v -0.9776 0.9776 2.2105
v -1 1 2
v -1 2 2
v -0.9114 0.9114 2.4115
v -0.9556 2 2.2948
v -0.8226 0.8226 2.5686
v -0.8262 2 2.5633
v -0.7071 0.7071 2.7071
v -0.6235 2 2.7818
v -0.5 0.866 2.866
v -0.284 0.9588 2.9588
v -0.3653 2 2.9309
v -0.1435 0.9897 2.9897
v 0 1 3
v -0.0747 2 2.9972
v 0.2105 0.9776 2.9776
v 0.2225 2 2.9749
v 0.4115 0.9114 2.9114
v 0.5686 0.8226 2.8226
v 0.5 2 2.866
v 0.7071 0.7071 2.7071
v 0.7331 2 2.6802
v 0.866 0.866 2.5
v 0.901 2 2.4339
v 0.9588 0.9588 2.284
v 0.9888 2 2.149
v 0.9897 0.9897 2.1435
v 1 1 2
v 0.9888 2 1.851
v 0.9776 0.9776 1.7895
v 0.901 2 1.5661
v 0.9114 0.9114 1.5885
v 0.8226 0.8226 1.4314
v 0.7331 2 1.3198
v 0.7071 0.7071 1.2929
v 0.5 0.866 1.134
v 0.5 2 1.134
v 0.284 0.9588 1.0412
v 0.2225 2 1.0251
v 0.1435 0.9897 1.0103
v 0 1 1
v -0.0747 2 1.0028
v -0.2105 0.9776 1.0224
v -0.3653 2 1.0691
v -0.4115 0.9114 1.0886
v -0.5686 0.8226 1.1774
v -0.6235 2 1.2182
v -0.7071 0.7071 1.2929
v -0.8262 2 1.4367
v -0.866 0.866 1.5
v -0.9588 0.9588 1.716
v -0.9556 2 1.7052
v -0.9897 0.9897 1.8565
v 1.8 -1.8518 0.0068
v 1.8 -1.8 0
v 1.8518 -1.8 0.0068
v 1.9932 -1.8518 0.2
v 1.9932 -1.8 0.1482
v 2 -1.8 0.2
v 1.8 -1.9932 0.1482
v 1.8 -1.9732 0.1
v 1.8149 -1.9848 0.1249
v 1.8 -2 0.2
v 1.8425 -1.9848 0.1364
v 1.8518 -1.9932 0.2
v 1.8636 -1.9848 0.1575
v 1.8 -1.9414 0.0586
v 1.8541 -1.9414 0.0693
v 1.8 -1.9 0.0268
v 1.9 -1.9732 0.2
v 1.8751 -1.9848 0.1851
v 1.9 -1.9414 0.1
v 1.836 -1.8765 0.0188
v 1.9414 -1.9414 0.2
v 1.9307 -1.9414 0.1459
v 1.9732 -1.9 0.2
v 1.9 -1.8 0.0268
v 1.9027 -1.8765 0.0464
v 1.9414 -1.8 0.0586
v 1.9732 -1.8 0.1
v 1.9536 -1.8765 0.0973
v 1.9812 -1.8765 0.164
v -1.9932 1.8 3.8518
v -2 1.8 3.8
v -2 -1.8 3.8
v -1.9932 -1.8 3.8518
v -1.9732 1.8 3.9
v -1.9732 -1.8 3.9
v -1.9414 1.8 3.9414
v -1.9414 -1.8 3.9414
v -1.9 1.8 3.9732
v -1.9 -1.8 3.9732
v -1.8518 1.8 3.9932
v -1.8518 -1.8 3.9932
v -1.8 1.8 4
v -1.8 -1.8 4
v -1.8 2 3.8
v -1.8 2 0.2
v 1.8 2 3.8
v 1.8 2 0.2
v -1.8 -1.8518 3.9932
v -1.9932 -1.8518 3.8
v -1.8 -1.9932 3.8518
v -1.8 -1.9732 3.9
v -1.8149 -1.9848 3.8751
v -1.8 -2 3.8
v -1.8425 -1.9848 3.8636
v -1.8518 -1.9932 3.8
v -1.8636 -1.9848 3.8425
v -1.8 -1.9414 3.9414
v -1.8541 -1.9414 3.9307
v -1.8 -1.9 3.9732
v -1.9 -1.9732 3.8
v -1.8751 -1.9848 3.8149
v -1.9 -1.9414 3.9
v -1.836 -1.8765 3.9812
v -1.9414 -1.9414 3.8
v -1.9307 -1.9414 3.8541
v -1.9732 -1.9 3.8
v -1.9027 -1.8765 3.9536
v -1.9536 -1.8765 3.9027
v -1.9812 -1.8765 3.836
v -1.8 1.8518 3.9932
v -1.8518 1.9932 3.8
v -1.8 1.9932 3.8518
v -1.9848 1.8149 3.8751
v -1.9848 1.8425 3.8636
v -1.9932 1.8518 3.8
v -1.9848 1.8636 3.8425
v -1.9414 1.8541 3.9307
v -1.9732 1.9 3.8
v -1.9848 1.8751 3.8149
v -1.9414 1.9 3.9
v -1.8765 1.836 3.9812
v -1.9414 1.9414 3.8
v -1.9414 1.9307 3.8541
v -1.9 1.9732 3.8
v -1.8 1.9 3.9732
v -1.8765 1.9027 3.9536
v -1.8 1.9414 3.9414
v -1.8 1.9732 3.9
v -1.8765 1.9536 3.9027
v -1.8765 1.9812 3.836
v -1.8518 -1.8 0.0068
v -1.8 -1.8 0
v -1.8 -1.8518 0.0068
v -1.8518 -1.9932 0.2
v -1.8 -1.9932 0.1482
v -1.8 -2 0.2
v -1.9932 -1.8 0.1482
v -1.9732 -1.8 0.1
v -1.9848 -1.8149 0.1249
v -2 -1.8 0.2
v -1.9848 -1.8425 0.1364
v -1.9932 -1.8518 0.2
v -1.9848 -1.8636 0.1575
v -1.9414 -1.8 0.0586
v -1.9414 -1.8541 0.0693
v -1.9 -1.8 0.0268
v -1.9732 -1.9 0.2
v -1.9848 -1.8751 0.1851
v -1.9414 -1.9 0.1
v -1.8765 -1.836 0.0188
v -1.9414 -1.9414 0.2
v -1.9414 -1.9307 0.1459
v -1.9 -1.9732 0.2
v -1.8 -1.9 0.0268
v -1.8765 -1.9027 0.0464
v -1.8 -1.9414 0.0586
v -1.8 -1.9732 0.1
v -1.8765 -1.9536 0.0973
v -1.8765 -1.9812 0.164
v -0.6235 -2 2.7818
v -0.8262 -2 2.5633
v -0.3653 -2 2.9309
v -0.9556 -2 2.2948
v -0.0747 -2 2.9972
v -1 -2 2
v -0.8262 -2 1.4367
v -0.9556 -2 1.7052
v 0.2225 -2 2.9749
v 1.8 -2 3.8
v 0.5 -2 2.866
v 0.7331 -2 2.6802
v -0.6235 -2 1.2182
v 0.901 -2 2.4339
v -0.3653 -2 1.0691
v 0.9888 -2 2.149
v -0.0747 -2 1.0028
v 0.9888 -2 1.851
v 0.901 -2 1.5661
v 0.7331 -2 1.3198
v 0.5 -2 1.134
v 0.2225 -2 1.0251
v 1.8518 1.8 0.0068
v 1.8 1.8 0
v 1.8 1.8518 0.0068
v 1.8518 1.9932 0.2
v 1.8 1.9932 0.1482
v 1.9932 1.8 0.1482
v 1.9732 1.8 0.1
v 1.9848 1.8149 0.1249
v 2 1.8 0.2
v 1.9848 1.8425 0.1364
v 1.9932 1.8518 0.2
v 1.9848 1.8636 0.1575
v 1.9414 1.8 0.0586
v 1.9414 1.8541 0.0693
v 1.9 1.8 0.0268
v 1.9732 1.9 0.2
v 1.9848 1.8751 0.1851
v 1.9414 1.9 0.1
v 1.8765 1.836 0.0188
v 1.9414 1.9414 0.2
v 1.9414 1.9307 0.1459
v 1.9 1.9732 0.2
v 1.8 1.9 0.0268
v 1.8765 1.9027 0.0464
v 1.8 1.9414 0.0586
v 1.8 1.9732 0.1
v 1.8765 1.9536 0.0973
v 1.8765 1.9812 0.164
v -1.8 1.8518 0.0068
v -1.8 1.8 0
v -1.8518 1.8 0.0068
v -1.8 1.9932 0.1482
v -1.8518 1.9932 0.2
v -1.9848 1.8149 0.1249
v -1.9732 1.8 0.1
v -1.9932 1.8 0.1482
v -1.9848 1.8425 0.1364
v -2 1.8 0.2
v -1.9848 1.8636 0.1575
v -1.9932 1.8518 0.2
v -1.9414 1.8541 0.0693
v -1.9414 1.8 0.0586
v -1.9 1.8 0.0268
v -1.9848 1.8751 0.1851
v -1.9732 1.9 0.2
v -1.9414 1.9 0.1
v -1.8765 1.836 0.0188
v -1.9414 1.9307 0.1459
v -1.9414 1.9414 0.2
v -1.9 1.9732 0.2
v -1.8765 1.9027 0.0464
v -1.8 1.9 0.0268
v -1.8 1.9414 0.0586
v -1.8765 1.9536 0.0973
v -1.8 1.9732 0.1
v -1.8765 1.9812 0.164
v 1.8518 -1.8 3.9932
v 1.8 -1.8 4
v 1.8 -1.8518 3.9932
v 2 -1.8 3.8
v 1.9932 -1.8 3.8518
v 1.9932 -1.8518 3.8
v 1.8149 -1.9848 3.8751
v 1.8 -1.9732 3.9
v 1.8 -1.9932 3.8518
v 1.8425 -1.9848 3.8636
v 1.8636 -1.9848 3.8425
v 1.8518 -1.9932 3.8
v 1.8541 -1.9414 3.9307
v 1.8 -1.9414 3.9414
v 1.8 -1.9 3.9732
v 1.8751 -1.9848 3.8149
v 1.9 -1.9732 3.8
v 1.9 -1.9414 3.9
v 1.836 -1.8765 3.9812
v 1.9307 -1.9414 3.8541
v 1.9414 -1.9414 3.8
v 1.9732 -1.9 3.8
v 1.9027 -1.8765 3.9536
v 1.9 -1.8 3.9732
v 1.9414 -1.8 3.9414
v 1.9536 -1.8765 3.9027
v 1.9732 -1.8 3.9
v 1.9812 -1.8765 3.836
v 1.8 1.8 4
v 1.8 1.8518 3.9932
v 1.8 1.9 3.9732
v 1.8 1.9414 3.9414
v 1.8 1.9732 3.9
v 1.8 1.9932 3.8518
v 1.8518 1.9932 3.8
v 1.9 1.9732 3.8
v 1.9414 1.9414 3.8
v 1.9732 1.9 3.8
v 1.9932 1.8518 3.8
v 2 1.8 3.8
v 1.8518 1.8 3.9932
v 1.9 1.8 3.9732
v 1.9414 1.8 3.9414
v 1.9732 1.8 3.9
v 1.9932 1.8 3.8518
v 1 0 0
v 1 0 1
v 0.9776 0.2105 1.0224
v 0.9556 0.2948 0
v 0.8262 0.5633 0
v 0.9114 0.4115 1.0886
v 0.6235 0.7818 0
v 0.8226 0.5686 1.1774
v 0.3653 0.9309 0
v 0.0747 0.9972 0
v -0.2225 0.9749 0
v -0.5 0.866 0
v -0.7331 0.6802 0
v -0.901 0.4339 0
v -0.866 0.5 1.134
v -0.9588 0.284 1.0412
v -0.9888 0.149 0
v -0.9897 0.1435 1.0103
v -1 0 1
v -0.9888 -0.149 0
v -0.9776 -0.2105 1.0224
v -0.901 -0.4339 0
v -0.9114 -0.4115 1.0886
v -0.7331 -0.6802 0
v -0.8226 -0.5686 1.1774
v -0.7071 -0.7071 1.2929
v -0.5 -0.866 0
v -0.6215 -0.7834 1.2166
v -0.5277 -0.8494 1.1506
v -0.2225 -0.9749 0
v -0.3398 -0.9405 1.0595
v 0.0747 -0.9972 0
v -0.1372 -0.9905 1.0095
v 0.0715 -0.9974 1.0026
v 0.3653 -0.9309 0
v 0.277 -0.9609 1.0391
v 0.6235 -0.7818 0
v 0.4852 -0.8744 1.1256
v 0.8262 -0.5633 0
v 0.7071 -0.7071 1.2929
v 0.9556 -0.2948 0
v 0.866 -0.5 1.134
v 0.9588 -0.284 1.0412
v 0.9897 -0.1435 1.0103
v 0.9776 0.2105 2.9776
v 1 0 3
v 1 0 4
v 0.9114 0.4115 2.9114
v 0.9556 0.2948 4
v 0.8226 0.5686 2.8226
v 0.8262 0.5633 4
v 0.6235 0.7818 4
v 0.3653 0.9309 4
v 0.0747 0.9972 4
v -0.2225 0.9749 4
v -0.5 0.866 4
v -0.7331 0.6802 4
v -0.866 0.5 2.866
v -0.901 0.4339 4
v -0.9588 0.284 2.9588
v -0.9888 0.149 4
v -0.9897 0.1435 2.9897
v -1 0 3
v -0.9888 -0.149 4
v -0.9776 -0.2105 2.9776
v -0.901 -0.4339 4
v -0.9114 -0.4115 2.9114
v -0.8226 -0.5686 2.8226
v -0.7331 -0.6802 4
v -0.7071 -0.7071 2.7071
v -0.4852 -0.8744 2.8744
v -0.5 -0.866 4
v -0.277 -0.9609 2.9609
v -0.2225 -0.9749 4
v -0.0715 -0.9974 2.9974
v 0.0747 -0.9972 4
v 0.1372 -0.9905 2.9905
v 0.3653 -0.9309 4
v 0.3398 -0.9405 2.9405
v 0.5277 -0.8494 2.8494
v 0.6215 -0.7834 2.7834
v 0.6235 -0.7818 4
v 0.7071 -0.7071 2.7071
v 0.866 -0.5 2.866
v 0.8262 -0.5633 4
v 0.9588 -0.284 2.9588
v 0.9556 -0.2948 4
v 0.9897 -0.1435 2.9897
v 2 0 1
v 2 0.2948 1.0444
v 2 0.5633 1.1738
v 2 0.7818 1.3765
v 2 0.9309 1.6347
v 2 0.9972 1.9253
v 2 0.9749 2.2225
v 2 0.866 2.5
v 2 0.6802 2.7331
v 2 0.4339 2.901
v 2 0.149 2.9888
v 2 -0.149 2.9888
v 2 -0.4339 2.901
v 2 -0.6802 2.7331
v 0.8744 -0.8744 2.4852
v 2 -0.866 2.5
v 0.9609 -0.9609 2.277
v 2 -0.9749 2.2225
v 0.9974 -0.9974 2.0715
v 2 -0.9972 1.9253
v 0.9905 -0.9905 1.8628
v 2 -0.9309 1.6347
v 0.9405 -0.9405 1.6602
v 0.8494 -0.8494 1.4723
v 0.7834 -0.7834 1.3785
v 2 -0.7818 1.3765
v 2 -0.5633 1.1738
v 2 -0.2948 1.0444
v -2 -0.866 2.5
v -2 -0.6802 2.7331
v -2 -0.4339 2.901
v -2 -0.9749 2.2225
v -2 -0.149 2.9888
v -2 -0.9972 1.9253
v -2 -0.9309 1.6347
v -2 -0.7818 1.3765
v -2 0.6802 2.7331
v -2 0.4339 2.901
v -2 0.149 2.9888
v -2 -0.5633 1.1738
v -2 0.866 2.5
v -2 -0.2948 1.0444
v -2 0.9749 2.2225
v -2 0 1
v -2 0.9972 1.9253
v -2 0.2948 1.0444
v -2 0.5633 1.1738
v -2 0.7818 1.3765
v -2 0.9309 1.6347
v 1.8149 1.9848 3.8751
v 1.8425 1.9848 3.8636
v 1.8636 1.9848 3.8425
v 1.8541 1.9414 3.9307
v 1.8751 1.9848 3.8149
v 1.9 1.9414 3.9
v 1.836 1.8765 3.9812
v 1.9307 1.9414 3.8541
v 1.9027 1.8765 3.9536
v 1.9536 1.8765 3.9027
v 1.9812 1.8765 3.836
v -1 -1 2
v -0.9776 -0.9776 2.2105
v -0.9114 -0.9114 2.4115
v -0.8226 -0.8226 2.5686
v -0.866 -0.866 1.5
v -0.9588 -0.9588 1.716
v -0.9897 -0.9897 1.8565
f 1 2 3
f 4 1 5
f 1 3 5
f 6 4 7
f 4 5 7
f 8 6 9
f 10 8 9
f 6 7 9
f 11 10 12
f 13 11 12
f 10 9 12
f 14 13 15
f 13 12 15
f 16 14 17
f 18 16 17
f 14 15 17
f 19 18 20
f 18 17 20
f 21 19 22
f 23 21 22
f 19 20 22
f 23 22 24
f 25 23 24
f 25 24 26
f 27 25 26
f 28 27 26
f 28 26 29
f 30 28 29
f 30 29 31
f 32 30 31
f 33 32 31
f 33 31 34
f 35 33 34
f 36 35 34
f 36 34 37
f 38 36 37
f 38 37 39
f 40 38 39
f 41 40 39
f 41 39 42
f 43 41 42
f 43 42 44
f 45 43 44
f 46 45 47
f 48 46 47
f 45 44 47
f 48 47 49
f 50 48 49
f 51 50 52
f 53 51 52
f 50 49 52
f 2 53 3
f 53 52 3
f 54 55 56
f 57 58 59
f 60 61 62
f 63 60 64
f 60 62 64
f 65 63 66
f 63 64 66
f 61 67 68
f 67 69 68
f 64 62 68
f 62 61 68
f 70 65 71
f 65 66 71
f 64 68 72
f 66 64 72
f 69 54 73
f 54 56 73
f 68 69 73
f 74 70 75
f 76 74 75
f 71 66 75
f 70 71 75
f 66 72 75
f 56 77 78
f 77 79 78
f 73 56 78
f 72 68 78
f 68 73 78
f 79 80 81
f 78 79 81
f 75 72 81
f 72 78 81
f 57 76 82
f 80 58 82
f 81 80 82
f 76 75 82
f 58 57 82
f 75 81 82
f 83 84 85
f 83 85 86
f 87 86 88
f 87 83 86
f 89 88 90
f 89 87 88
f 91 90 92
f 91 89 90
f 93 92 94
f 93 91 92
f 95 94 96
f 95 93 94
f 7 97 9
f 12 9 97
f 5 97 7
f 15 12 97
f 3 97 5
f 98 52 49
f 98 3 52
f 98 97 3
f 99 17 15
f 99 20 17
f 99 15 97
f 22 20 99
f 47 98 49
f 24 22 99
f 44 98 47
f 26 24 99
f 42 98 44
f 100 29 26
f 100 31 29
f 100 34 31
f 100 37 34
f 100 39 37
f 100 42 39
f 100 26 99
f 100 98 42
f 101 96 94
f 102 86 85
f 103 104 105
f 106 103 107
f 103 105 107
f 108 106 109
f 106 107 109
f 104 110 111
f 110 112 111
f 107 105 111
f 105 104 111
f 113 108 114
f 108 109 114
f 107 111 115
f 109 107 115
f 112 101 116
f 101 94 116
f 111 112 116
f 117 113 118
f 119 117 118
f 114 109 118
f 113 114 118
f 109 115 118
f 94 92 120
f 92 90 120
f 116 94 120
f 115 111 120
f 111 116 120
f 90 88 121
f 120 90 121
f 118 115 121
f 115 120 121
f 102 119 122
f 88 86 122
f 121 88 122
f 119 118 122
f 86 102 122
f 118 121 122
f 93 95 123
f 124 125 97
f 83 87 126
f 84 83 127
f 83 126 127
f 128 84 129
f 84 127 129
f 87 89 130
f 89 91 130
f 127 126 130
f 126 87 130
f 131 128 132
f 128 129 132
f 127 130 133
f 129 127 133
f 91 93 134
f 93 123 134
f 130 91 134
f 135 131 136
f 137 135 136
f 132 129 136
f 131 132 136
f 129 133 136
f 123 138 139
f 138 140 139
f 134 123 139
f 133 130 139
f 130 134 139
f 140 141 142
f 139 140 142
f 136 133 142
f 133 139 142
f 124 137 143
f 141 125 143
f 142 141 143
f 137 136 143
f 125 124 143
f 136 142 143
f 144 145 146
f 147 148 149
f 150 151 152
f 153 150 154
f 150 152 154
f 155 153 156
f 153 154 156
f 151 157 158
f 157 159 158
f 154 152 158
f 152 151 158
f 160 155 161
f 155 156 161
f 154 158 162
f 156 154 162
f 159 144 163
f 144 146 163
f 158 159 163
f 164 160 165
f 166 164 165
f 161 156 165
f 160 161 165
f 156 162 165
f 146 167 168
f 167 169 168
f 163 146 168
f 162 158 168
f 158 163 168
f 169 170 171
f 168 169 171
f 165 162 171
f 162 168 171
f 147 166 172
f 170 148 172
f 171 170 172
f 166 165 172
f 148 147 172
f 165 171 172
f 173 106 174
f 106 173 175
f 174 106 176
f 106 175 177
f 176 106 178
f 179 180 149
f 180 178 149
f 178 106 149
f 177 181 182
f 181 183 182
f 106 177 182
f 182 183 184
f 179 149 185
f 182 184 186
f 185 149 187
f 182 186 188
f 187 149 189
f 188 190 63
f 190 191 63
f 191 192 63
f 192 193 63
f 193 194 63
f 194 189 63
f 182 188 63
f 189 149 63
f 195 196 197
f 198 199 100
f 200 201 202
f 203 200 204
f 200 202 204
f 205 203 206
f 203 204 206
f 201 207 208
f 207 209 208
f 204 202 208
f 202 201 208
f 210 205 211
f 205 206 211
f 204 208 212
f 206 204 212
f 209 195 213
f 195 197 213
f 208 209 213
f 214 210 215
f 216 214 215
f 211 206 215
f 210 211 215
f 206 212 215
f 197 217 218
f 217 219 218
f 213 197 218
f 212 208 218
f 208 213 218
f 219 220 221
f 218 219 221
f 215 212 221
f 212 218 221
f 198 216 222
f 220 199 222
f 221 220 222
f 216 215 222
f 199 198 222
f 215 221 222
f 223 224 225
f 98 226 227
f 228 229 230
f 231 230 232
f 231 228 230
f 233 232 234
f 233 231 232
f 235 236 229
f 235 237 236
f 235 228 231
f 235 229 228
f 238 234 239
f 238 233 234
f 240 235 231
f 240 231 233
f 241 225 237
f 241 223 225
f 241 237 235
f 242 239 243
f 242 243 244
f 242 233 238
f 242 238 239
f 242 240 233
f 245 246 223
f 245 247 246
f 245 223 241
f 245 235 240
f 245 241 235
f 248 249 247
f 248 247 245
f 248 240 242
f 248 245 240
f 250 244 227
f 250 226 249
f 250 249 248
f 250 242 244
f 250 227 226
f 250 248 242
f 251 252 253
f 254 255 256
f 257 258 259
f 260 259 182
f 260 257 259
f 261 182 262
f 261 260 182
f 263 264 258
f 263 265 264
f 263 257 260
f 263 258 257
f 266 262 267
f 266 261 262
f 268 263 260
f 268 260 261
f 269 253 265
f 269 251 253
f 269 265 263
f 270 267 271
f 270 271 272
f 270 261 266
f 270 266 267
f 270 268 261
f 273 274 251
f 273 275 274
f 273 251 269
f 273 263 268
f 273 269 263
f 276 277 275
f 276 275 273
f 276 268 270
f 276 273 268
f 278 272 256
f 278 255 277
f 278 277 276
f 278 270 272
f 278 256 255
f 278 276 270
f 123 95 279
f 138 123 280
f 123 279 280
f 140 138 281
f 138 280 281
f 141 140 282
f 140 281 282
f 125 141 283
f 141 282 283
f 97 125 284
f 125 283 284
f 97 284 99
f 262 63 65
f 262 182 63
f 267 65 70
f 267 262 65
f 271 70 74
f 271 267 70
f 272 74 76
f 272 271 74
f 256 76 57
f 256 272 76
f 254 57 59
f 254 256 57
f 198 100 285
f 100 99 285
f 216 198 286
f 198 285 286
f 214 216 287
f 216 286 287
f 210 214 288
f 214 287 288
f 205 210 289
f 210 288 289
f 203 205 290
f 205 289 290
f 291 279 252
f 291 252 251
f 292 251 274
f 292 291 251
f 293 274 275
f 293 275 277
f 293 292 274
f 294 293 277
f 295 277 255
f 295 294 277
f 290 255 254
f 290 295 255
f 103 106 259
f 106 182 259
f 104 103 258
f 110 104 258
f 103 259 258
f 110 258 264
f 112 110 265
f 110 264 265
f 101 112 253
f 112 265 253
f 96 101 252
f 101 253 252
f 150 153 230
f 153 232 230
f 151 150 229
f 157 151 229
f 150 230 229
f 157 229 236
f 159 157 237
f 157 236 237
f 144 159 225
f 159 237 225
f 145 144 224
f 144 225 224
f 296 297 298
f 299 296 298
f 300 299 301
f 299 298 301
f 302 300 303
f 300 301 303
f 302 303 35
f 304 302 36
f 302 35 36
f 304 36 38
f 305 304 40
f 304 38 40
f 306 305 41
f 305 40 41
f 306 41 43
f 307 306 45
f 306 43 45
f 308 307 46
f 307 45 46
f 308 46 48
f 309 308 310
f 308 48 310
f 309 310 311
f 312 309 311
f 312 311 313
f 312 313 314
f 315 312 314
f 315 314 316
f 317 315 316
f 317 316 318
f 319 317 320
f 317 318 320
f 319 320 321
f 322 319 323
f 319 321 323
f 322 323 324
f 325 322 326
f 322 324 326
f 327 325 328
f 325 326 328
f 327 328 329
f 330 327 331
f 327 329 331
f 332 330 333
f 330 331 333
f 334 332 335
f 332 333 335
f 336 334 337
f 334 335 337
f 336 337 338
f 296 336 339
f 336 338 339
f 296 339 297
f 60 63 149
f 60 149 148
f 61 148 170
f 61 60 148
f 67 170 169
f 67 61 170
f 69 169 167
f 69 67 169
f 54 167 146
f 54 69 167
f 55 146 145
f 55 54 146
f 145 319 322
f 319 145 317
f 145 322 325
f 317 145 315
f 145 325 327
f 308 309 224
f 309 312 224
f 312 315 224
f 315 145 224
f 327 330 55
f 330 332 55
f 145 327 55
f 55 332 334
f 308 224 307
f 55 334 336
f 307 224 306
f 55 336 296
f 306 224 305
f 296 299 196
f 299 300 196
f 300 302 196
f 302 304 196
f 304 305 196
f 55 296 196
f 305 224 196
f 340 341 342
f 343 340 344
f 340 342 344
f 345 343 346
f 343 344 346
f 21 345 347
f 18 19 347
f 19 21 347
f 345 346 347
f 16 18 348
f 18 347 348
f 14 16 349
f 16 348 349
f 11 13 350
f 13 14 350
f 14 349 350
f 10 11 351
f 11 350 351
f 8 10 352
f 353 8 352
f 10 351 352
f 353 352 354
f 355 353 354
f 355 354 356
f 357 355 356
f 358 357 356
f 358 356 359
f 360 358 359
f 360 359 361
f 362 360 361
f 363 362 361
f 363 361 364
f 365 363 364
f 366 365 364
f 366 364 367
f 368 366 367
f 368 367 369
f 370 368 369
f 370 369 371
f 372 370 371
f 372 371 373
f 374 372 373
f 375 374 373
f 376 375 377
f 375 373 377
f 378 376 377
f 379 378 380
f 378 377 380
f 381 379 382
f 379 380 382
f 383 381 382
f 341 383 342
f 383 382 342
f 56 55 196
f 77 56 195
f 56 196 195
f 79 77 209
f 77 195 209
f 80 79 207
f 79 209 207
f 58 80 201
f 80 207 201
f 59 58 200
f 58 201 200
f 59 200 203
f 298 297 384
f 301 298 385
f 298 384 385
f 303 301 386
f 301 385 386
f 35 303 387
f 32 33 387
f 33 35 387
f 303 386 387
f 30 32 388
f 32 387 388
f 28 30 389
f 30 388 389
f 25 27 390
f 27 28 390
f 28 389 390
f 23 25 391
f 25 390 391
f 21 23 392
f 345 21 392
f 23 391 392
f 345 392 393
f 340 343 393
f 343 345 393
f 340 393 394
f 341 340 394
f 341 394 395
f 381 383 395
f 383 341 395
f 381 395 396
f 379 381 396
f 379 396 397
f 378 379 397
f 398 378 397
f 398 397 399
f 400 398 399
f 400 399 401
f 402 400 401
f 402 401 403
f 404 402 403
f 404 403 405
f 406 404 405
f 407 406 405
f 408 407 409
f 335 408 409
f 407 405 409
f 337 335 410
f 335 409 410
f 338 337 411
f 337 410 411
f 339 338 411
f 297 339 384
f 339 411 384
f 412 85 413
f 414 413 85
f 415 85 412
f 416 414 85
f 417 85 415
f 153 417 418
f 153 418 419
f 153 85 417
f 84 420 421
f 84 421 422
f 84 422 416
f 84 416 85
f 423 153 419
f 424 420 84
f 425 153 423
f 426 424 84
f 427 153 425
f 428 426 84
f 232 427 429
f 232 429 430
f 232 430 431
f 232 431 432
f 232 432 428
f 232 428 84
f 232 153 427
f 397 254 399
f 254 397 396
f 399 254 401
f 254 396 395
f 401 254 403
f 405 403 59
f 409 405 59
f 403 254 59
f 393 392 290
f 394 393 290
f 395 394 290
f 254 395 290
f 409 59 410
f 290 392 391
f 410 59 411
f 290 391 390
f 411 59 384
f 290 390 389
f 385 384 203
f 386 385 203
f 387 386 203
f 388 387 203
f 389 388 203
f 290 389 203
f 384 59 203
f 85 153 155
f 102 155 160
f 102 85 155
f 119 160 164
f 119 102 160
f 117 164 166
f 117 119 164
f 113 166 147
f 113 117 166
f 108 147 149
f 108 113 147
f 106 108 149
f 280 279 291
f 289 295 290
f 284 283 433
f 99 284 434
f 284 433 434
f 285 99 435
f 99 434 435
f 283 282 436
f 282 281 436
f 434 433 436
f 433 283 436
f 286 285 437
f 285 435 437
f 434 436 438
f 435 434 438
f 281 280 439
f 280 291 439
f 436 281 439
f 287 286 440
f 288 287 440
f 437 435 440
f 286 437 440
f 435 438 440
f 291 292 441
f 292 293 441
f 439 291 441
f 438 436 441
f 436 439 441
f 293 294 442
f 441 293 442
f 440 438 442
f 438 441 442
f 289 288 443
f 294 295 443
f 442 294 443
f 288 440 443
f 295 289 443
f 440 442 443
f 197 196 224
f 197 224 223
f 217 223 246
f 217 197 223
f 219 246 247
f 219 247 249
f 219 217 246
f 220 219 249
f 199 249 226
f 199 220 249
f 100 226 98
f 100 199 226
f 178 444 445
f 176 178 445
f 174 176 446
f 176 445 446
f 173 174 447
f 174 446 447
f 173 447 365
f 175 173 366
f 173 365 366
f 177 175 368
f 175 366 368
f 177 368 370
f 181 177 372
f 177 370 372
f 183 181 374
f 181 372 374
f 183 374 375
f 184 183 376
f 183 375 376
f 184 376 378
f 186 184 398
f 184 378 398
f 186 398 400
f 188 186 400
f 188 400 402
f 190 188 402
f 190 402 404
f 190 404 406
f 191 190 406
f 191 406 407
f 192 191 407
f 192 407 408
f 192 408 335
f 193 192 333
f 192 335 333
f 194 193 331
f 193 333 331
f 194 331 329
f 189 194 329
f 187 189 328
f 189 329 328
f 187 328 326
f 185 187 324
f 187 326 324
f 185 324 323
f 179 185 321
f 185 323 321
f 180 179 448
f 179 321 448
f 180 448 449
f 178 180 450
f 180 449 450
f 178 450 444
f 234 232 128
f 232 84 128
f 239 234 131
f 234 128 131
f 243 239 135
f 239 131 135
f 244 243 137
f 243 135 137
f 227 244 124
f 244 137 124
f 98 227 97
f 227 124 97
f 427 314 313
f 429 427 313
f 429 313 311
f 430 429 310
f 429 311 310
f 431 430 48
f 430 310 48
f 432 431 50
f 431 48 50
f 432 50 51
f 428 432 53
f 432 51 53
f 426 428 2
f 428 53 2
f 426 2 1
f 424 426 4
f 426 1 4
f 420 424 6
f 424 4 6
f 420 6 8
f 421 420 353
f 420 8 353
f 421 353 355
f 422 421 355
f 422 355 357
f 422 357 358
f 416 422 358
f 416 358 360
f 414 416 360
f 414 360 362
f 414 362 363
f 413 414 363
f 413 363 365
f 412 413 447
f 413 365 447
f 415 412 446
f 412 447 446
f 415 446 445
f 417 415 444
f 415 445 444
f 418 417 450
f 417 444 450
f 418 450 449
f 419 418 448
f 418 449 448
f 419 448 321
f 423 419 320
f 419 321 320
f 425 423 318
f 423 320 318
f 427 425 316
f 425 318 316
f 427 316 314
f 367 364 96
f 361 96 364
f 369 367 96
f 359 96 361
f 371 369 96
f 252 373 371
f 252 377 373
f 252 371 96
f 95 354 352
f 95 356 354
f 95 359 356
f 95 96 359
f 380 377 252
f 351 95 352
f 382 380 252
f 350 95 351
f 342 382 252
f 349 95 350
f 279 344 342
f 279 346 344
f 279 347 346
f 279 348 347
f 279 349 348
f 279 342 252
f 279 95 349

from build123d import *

# Parameters (mm, degrees)
SKETCH1_W           = 4
SKETCH1_H           = 4
BOSS_EXTRUDE1_DEPTH = 4
CUT_EXTRUDE1_REACH  = 8
SKETCH2_R           = 1
SKETCH3_R           = 1
CUT_EXTRUDE2_DEPTH  = 5.898979486
SKETCH4_R           = 1
CUT_EXTRUDE3_DEPTH  = 7
FILLET1_R           = 0.2


with BuildPart() as part:
    # Sketch1 → Boss-Extrude1 (new body)
    with BuildSketch(Plane.XY):
        Rectangle(SKETCH1_W, SKETCH1_H)
    extrude(amount=BOSS_EXTRUDE1_DEPTH)

    # Sketch2 → Cut-Extrude1 (cut, up to next)
    with BuildSketch(Plane(origin=(0, 2, 0), x_dir=(1, 0, 0), z_dir=(0, 1, 0)), mode=Mode.PRIVATE) as cut_extrude1_sk1:
        with Locations(Location((0, -2, 0), (0, 0, 180))):
            Circle(SKETCH2_R)
    cut_extrude1_tool1 = extrude(cut_extrude1_sk1.sketch, amount=-CUT_EXTRUDE1_REACH, mode=Mode.PRIVATE) & part.part
    add(cut_extrude1_tool1.solids().sort_by_distance((0, 2, 2))[0], mode=Mode.SUBTRACT)

    # Sketch3 → Cut-Extrude2 (cut, through all)
    with BuildSketch(Plane.XY.offset(4)):
        Circle(SKETCH3_R)
    extrude(amount=-CUT_EXTRUDE2_DEPTH, mode=Mode.SUBTRACT)

    # Sketch4 → Cut-Extrude3 (cut, through all)
    with BuildSketch(Plane(origin=(2, 0, 0), x_dir=(0, 0, -1), z_dir=(1, 0, 0))):
        with Locations((-2, 0)):
            Circle(SKETCH4_R)
    extrude(amount=-CUT_EXTRUDE3_DEPTH, mode=Mode.SUBTRACT)

    # Fillet1
    fillet1_edges = [part.edges().sort_by_distance(p)[0] for p in [
        (2, 0, 4),
        (0, 2, 4),
        (-2, 0, 4),
        (0, 2, 0),
        (2, 0, 0),
        (0, -2, 0),
        (-2, 0, 0),
        (0, -2, 4),
        (-2, 2, 2),
        (2, 2, 2),
        (2, -2, 2),
        (-2, -2, 2),
    ]]
    fillet(fillet1_edges, radius=FILLET1_R)


solid = part.part
